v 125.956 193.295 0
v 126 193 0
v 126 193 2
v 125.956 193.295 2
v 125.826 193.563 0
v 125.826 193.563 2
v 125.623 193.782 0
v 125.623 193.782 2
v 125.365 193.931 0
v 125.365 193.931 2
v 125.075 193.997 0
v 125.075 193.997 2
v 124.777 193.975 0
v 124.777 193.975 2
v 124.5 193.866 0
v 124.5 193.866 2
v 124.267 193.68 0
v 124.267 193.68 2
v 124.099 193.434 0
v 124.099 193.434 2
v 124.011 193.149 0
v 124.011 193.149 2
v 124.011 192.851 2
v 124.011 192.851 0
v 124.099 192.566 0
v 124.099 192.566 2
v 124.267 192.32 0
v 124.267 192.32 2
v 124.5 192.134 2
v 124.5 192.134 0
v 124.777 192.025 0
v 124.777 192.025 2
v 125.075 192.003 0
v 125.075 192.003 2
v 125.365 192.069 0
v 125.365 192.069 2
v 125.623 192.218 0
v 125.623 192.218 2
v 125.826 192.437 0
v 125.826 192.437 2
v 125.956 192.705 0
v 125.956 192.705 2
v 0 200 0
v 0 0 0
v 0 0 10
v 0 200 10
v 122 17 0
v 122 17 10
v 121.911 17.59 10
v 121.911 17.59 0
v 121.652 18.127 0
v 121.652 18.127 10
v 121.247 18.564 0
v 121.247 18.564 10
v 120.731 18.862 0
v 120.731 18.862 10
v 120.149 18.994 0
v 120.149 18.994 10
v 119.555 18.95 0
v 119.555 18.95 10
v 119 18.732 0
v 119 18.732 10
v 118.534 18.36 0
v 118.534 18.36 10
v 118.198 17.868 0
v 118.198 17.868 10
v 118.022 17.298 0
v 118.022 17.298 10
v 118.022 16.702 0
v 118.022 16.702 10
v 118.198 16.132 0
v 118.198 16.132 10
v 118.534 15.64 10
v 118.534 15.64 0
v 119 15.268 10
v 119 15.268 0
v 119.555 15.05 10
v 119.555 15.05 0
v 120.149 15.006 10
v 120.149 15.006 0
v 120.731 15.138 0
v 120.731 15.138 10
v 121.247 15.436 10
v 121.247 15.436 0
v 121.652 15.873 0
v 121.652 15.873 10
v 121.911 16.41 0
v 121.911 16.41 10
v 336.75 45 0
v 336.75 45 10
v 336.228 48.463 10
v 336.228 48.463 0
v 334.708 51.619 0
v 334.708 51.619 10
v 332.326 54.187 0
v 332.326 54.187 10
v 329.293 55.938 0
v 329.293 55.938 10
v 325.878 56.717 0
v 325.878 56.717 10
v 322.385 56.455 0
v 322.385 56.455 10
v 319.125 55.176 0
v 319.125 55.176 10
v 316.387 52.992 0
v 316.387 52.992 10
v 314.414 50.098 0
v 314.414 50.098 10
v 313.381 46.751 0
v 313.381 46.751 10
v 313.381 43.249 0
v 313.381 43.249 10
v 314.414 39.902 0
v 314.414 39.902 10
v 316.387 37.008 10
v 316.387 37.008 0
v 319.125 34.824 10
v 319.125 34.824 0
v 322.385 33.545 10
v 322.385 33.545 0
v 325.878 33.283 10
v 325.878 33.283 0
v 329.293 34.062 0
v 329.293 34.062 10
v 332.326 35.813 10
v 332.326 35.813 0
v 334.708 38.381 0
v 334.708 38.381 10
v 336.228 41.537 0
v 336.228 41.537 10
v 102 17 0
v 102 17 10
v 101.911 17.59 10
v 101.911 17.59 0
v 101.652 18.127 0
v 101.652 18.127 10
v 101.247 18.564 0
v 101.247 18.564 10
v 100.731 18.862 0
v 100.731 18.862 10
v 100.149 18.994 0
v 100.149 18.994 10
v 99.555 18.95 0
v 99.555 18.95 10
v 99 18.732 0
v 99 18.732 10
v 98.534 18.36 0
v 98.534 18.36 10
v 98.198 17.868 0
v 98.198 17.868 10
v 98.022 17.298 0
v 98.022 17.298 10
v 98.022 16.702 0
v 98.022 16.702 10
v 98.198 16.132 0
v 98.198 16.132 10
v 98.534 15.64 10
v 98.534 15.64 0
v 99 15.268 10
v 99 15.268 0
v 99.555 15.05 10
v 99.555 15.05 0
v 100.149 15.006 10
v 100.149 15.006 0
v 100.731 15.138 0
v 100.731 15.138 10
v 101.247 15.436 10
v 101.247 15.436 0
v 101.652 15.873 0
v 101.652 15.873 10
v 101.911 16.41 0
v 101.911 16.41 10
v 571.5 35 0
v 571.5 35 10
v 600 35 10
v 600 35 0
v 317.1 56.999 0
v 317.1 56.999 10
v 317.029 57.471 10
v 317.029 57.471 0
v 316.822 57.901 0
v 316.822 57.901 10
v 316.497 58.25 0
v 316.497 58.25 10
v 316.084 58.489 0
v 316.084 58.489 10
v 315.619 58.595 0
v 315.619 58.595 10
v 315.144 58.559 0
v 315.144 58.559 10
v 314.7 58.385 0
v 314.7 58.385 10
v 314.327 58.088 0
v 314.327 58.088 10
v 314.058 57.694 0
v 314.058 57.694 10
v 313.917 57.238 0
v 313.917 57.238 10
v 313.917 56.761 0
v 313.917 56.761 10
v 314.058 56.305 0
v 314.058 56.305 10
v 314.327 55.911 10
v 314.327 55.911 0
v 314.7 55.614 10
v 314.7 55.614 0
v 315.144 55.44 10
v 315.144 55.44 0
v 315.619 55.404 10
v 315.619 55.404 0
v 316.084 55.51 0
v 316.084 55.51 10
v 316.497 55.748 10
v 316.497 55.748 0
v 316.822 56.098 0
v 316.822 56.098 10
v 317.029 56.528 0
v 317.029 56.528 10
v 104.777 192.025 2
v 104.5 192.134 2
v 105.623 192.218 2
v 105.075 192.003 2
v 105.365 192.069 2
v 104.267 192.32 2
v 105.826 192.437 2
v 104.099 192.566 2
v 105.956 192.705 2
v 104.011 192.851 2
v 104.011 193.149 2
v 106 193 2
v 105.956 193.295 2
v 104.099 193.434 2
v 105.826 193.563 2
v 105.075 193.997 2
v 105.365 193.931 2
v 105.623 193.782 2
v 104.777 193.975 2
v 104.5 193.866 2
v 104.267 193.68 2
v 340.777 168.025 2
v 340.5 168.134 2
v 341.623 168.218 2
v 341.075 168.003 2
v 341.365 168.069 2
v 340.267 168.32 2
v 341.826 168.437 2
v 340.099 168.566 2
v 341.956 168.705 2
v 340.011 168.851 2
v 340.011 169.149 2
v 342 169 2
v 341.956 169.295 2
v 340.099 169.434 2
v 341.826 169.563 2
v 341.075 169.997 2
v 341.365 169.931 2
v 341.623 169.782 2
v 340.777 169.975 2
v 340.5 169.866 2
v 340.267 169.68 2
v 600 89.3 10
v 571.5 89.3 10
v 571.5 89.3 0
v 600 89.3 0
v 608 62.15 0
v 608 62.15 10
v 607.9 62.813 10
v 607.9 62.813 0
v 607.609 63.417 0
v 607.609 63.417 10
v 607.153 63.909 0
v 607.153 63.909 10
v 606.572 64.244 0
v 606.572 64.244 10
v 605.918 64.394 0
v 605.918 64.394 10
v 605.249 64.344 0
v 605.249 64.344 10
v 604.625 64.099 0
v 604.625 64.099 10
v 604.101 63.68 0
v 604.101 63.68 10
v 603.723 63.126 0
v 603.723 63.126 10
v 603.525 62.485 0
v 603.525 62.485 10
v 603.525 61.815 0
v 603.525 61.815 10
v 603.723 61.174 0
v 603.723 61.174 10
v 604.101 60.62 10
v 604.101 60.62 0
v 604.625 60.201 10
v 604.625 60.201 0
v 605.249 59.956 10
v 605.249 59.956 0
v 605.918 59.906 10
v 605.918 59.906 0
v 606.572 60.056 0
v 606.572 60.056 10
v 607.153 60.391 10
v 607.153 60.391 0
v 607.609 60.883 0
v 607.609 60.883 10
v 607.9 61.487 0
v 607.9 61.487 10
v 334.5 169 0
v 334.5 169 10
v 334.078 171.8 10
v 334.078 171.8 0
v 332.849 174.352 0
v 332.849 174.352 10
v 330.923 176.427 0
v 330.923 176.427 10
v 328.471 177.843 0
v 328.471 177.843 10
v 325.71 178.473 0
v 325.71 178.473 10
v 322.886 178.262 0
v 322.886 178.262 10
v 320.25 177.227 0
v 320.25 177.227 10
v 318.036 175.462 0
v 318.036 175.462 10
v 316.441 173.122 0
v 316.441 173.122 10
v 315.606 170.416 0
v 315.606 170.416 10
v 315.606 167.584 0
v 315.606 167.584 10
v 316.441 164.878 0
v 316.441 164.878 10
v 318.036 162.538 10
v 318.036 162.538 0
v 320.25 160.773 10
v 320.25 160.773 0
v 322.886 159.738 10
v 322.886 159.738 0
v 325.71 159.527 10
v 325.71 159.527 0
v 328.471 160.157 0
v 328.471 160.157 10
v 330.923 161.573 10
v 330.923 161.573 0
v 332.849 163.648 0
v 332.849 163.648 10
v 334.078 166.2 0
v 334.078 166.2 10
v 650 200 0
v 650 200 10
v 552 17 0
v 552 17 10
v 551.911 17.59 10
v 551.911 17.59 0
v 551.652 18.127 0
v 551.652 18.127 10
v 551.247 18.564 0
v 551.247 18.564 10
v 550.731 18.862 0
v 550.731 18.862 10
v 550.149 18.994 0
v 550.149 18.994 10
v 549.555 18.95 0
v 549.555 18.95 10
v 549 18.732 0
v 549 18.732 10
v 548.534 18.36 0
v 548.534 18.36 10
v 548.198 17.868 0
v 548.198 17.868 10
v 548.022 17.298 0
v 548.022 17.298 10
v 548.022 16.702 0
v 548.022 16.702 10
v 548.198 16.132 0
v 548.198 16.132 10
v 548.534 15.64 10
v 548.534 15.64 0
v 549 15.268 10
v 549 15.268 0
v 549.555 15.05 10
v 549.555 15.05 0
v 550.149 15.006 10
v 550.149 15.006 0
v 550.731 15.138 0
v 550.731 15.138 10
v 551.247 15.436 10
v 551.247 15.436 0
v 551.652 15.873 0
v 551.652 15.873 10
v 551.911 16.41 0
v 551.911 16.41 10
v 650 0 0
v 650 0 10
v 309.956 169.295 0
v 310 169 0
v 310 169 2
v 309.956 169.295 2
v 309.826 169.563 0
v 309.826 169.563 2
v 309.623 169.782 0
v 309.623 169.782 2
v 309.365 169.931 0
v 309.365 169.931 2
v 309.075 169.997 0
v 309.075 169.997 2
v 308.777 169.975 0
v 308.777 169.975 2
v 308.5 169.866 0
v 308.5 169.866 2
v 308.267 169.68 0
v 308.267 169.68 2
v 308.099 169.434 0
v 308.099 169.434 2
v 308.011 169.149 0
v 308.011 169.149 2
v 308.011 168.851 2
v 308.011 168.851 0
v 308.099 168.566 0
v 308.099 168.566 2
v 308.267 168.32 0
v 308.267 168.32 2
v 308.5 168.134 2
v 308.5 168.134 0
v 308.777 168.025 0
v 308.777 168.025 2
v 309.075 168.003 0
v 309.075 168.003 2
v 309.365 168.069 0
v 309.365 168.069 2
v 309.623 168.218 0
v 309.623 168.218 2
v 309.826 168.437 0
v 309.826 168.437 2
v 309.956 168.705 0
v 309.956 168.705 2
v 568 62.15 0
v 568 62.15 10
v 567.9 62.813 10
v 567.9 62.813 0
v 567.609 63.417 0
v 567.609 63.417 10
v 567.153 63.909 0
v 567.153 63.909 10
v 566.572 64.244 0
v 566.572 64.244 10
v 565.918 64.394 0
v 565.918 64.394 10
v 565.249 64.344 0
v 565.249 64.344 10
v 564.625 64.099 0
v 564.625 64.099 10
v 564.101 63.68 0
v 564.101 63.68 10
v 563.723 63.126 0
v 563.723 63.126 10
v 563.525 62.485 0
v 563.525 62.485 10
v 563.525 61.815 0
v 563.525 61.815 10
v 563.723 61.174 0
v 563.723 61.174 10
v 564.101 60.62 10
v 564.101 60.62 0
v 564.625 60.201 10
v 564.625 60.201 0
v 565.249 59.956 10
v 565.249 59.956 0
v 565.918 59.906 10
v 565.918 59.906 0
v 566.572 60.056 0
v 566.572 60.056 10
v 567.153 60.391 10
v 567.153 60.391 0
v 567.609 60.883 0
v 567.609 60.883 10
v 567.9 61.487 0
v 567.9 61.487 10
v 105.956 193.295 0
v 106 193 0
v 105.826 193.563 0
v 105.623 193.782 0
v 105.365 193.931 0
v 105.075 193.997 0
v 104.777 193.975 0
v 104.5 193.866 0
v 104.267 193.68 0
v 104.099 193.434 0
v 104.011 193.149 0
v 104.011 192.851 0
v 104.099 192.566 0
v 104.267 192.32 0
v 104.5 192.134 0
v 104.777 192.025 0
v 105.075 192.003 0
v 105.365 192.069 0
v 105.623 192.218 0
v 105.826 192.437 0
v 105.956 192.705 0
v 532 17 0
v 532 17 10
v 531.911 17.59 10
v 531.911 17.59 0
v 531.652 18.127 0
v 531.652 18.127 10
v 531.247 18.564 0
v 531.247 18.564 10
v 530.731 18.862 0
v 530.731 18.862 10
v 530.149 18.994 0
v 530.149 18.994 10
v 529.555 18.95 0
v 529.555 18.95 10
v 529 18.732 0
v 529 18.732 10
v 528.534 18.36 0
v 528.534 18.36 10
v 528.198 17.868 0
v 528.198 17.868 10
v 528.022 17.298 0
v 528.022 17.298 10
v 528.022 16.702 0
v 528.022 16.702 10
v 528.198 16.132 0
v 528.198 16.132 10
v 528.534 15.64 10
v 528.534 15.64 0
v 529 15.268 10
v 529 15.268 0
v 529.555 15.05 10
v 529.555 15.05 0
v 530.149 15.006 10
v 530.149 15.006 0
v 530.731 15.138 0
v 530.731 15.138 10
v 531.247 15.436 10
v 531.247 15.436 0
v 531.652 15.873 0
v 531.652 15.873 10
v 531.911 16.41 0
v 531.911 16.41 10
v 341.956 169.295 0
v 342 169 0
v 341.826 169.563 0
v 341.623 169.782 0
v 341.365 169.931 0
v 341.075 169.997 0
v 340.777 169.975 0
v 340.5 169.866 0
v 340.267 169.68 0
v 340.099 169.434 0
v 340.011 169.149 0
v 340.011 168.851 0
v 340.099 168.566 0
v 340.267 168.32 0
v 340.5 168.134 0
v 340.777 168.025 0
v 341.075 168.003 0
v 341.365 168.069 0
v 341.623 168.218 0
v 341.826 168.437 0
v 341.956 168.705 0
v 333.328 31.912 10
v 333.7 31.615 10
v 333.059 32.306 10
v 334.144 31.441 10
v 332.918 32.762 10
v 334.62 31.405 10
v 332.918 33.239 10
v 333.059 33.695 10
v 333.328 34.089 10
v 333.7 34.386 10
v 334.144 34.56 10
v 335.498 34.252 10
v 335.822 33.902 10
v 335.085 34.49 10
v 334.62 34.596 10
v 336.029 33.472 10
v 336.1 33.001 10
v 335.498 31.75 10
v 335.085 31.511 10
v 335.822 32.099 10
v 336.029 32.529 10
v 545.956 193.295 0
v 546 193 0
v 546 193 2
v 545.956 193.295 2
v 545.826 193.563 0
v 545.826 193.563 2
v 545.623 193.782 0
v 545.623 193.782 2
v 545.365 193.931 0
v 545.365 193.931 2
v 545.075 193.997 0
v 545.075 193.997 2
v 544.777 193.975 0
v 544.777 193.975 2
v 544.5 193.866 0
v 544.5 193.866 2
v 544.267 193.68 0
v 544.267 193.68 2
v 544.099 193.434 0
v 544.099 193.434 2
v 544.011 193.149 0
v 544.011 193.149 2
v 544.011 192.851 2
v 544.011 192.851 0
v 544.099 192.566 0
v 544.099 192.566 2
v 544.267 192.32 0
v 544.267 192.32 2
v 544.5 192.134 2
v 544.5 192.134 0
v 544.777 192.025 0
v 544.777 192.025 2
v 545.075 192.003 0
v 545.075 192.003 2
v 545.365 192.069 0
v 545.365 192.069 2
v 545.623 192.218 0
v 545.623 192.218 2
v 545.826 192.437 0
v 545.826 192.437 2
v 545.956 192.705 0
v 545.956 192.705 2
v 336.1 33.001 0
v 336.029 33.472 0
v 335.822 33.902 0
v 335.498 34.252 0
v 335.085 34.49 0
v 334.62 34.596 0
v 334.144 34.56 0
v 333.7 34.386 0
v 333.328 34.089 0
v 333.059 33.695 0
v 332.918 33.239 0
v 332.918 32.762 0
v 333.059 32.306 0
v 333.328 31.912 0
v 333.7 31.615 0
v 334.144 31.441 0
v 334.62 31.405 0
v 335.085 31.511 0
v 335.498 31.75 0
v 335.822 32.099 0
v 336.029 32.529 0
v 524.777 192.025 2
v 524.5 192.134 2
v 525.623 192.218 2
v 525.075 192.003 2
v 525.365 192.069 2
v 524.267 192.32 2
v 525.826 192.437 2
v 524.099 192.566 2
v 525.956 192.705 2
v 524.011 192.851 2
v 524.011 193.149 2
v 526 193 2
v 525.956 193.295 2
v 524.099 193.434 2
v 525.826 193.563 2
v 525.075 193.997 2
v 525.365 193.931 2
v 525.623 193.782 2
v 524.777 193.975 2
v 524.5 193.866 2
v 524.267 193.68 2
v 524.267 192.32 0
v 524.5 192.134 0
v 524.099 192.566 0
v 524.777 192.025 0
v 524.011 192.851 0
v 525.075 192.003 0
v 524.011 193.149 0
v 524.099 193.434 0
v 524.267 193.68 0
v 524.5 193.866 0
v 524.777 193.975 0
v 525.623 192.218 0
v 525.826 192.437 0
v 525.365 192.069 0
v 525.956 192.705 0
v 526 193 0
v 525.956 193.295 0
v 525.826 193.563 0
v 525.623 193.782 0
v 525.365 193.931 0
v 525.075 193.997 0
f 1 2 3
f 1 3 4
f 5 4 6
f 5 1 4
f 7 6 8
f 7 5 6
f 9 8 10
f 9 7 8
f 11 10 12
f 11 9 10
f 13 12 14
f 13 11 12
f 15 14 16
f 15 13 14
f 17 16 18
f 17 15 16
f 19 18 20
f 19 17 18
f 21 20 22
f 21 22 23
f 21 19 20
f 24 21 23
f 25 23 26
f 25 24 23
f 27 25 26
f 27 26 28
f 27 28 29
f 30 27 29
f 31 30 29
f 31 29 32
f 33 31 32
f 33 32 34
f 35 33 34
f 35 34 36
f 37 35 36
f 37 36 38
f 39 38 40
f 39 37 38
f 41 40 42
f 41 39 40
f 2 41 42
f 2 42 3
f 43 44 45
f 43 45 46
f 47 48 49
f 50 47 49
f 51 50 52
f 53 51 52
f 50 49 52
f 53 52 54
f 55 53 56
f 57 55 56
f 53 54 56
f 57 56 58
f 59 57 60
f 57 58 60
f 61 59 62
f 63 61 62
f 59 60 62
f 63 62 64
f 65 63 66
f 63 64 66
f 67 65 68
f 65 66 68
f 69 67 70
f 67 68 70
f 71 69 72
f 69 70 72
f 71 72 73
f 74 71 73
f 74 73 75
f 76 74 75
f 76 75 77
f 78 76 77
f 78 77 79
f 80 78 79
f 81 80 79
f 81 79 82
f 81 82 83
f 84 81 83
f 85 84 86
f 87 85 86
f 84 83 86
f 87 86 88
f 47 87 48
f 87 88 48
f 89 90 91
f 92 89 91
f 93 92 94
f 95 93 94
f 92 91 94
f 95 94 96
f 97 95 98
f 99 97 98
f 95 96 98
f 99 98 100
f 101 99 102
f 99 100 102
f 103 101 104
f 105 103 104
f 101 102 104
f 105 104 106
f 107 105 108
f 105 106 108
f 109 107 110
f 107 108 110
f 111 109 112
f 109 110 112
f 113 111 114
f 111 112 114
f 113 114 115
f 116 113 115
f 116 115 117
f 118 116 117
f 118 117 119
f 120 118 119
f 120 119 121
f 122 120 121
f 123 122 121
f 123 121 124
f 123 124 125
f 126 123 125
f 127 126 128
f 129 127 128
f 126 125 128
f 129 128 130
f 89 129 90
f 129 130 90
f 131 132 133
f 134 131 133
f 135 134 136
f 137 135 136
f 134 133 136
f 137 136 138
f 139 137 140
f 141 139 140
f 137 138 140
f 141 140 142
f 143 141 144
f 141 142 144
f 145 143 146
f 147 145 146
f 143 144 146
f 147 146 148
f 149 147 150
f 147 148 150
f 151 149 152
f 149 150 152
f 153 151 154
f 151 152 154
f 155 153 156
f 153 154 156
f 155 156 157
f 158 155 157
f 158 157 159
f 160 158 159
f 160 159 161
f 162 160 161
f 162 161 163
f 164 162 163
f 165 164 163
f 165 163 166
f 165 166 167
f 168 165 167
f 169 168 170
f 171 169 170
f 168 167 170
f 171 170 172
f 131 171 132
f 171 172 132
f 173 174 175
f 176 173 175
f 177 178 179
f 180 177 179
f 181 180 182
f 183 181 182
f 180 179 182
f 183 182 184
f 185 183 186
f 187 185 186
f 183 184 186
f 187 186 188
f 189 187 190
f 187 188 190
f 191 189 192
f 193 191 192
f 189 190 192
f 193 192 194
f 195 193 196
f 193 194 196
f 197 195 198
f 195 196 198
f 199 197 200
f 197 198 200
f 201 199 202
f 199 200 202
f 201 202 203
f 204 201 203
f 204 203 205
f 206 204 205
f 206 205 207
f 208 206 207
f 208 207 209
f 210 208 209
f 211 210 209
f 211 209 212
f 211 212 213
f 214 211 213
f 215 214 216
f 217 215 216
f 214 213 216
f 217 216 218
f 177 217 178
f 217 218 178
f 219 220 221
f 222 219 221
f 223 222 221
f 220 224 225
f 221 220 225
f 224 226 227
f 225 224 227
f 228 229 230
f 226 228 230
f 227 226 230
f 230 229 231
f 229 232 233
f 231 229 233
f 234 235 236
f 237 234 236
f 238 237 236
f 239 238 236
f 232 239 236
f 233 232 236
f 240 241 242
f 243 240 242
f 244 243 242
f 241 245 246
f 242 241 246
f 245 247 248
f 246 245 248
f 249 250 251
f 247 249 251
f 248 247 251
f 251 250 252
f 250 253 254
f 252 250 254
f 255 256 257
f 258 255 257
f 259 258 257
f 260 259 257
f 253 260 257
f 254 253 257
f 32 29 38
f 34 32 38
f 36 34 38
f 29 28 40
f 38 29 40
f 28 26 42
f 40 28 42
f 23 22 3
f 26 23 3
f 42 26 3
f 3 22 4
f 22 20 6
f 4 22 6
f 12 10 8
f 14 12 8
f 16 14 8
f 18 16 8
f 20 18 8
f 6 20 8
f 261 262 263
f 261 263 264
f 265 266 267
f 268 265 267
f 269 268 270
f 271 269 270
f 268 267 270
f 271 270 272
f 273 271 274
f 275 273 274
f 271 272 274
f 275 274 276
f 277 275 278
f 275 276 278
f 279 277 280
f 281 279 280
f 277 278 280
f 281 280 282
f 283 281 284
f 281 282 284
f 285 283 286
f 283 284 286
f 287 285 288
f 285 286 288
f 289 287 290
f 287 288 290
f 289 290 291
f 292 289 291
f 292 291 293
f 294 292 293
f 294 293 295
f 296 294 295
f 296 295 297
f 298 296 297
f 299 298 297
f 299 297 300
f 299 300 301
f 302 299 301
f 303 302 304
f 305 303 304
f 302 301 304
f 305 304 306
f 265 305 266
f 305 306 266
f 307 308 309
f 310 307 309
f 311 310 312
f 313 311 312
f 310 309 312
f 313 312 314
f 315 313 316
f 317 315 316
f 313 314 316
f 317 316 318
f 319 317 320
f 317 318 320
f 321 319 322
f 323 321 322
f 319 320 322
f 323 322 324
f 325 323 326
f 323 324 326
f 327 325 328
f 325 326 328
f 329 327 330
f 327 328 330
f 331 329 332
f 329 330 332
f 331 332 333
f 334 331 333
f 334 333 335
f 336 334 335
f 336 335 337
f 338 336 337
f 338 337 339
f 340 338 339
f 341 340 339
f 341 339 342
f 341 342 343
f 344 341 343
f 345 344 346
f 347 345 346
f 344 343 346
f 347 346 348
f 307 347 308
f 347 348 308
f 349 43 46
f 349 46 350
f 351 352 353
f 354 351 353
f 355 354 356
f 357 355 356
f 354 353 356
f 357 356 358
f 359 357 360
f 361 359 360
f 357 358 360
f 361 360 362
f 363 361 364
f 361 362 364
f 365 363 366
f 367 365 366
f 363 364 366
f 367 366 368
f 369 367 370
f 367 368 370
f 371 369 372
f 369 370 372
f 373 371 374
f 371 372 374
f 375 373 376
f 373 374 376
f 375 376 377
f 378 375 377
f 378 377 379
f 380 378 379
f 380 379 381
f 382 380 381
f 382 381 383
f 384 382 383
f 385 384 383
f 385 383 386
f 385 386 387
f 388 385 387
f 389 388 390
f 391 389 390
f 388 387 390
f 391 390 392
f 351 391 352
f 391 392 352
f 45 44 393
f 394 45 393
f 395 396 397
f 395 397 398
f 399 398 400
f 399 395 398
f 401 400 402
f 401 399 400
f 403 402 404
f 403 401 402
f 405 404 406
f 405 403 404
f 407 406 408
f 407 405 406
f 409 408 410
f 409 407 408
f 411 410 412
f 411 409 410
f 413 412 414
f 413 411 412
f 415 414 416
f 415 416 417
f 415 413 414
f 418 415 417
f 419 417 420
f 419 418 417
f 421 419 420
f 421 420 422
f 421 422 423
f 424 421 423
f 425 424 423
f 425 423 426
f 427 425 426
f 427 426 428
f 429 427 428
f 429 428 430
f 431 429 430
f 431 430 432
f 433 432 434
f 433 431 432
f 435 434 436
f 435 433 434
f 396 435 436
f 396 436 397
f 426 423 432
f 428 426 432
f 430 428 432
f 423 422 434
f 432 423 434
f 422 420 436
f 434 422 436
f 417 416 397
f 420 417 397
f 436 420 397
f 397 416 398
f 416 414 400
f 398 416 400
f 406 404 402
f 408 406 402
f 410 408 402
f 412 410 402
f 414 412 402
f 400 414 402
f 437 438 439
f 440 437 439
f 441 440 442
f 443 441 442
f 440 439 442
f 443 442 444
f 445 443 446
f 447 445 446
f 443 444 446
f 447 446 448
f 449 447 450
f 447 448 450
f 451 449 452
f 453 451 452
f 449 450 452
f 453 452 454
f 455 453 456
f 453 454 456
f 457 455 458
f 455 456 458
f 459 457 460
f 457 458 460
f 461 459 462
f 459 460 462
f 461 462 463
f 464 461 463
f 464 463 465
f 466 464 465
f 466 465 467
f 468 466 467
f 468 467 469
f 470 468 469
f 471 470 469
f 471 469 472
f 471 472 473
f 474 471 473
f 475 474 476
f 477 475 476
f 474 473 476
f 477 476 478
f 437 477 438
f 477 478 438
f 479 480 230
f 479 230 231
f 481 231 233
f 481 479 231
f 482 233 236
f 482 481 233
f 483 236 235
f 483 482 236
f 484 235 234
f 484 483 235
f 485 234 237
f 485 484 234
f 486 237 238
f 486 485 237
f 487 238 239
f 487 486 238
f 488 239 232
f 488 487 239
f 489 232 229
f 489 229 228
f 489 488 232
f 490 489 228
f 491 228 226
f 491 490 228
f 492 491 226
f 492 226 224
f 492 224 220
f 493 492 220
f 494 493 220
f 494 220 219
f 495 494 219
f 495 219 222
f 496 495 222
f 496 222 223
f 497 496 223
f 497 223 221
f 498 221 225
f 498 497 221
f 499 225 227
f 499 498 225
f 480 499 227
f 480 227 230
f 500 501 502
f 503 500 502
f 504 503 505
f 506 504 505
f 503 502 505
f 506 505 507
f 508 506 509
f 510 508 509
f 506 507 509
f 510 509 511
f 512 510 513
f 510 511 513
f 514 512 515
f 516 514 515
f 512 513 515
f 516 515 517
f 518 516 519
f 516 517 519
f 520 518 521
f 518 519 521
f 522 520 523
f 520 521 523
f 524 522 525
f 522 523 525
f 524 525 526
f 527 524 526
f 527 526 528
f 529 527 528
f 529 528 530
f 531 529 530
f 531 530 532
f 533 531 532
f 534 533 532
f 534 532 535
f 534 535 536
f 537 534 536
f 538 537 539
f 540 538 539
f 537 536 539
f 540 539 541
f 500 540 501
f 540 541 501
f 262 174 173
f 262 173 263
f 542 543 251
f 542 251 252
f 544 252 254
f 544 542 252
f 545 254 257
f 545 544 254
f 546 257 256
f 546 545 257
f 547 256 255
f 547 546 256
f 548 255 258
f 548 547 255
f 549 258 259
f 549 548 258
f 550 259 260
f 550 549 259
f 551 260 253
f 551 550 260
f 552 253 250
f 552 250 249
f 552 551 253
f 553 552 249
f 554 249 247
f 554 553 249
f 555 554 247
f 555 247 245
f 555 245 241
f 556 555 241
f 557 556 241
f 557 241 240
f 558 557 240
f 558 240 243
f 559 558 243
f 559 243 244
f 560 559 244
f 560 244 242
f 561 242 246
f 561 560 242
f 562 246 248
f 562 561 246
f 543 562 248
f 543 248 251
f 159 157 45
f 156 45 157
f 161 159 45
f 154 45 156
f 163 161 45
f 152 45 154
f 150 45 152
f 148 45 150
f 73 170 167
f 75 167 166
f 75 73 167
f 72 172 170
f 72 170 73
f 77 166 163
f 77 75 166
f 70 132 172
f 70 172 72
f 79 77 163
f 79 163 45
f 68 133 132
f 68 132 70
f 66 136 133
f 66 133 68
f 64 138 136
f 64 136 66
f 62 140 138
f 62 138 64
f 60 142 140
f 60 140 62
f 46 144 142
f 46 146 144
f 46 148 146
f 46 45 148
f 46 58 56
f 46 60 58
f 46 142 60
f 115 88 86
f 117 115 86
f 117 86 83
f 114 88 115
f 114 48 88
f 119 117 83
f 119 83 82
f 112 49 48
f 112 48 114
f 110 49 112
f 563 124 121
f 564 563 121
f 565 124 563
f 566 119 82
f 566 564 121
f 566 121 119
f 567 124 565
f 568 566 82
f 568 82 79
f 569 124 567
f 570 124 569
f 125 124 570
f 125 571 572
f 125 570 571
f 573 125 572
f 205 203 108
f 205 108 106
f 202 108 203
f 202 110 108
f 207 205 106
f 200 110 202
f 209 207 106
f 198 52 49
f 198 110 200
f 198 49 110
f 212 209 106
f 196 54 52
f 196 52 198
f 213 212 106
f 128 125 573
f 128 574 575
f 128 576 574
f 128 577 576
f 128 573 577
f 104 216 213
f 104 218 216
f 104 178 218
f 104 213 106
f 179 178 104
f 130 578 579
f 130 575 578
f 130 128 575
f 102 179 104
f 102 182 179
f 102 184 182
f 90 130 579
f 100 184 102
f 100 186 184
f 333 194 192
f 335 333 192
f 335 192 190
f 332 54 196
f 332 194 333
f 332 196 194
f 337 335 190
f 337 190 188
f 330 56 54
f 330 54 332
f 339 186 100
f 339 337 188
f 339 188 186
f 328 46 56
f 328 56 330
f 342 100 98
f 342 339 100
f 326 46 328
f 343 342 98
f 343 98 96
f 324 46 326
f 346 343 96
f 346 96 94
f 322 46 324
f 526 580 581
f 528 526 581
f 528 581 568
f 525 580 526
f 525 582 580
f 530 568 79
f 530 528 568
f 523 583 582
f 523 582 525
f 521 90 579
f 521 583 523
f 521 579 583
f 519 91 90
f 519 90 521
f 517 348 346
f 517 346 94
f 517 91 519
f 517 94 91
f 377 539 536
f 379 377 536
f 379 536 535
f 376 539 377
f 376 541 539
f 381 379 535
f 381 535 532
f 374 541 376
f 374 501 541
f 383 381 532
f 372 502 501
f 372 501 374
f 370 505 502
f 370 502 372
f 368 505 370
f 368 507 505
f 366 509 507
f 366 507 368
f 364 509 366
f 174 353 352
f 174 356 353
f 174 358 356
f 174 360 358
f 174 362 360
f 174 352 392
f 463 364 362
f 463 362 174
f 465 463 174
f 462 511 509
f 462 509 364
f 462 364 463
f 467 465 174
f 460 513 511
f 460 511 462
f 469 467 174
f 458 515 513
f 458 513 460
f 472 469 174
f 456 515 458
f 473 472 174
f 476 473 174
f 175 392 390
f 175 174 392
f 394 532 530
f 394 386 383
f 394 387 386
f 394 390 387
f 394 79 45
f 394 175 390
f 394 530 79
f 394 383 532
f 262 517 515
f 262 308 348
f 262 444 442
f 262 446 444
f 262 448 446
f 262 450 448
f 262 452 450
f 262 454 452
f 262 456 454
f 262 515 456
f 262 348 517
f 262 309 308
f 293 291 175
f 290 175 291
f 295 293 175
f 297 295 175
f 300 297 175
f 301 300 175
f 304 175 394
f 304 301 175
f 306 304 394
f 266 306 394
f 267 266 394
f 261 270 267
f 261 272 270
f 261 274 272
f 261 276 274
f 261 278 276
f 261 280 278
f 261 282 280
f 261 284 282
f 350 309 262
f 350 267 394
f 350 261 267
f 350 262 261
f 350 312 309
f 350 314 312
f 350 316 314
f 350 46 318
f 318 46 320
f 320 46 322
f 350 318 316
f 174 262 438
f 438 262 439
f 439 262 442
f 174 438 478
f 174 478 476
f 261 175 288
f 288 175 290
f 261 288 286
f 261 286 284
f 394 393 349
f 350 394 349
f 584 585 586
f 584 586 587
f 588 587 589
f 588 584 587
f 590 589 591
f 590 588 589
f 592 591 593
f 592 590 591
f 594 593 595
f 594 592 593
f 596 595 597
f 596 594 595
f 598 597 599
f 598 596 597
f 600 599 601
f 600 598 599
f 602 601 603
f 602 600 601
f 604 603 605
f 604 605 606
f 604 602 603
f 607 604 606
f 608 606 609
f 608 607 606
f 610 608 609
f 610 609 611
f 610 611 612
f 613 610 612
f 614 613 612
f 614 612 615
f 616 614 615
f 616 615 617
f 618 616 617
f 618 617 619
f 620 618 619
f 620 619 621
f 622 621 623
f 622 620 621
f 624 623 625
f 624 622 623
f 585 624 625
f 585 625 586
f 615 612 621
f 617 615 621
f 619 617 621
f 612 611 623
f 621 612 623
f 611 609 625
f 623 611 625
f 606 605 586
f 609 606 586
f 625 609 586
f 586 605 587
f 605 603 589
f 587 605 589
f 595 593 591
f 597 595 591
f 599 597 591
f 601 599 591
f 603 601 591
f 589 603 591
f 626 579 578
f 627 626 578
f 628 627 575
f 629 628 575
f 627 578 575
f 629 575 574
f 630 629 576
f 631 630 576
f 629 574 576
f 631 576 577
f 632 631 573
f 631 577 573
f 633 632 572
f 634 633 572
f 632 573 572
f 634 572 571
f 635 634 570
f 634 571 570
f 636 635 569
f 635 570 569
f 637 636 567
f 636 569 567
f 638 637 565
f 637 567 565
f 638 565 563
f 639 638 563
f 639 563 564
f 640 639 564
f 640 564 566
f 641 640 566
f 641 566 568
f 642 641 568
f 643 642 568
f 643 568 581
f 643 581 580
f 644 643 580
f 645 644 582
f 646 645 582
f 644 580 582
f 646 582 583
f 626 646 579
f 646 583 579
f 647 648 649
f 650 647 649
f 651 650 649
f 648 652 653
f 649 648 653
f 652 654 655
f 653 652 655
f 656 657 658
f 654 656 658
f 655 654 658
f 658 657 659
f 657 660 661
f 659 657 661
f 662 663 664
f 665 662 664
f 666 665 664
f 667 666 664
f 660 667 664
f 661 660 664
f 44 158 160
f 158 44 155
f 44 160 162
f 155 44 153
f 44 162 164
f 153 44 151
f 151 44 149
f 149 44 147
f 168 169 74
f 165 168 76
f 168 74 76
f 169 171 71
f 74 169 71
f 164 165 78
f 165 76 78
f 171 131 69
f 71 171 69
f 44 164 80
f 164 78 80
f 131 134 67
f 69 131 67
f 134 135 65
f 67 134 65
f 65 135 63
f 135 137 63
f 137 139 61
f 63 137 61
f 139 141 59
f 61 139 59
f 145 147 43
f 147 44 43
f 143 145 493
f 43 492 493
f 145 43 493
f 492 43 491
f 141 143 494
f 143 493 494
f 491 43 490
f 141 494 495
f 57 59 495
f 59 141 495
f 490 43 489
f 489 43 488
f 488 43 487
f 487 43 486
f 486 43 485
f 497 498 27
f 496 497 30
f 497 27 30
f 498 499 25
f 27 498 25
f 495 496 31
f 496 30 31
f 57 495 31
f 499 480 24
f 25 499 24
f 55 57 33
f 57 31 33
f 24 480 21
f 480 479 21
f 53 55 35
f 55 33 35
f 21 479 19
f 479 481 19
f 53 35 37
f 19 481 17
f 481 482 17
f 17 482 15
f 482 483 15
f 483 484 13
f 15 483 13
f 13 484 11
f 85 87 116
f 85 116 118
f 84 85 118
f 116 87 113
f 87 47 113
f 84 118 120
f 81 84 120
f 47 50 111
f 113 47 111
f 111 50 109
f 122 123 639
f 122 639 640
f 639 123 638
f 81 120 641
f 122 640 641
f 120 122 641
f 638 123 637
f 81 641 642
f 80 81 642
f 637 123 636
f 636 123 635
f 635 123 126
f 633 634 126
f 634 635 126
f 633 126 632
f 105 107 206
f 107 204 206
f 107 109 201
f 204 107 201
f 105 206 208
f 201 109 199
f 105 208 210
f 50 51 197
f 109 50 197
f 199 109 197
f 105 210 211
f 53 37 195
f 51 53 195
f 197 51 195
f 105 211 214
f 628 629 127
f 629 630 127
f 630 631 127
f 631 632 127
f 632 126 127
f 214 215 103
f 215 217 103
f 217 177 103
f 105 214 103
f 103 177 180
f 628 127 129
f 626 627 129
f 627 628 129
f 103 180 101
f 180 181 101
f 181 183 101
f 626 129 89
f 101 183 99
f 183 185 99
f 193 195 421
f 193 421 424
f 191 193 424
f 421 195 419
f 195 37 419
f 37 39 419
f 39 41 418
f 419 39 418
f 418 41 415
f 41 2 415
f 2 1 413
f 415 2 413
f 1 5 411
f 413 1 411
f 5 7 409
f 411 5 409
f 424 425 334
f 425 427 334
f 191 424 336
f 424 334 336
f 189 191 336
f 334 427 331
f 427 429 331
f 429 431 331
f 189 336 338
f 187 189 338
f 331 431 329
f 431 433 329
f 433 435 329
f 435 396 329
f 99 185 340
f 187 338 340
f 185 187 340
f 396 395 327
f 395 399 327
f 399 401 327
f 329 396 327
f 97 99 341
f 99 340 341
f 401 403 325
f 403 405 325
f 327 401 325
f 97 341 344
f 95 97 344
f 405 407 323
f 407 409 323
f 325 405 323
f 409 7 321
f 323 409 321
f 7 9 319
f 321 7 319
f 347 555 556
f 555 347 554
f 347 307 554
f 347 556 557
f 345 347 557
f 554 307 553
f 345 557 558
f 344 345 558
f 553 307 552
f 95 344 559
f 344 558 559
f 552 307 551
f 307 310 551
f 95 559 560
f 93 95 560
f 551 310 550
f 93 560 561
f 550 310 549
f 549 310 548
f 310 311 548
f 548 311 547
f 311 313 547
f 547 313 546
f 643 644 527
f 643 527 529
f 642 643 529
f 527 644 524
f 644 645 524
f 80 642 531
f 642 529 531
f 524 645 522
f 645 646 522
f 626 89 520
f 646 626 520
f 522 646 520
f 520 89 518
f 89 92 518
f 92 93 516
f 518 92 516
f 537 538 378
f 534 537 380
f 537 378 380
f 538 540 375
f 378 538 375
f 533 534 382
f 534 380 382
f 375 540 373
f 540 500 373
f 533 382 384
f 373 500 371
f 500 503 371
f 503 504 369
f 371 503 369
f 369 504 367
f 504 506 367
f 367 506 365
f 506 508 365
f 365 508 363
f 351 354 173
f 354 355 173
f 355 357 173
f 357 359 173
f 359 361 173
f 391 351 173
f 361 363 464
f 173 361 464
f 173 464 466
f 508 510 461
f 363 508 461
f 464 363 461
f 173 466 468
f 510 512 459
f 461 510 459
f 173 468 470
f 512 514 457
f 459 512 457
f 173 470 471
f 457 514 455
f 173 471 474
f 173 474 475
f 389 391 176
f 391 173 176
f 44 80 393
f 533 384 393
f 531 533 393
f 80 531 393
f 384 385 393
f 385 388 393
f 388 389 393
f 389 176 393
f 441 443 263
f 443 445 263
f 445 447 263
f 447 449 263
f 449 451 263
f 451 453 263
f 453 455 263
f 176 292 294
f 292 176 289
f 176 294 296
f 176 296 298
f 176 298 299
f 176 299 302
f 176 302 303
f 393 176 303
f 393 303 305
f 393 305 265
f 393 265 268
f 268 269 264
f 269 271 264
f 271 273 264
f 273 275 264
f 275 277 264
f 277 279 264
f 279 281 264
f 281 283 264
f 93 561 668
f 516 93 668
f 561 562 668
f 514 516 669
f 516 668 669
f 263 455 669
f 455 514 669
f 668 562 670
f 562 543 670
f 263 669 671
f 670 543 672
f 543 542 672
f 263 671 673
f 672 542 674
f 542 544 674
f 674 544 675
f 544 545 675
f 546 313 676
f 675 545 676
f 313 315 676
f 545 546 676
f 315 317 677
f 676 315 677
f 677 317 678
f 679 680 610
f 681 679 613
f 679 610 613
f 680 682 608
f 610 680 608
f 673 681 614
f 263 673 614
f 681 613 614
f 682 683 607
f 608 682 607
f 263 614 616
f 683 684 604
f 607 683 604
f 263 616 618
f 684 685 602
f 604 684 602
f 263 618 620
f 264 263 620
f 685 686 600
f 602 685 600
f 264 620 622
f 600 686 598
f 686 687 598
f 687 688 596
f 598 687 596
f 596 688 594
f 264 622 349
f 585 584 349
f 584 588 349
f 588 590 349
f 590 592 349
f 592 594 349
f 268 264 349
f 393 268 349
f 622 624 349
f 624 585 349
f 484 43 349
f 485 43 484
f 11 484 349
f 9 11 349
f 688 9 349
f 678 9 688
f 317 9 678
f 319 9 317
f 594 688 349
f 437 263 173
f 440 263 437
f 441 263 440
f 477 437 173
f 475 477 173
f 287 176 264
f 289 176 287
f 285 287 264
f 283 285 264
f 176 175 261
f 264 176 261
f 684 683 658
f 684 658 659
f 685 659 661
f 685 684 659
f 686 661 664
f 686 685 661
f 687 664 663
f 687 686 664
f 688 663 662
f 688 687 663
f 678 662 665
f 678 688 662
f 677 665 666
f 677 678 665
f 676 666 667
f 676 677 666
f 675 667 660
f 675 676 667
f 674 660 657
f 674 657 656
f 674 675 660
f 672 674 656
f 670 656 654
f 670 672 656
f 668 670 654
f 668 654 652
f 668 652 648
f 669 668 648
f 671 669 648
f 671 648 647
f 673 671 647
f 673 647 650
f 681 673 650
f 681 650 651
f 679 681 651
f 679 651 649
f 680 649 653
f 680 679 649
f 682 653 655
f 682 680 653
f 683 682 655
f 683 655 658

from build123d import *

# Parameters (mm, degrees)
ESQUISSE1_W             = 650
ESQUISSE1_H             = 200
BOSS_EXTRU_1_DEPTH      = 10
ESQUISSE2_R             = 2
ENL_V_MAT_EXTRU_1_DEPTH = 10
ESQUISSE3_R             = 1.6
ESQUISSE3_R_2           = 11.75
ESQUISSE3_W             = 28.5
ESQUISSE3_H             = 54.3
ESQUISSE3_R_3           = 2.25
ENL_V_MAT_EXTRU_2_DEPTH = 10
ESQUISSE4_R             = 9.5
ENL_V_MAT_EXTRU_3_DEPTH = 10
ESQUISSE5_R             = 1
ENL_V_MAT_EXTRU_4_DEPTH = 2


with BuildPart() as part:
    # Esquisse1 → Boss.-Extru.1 (new body)
    with BuildSketch(Plane.XY):
        with Locations((325, 100)):
            Rectangle(ESQUISSE1_W, ESQUISSE1_H)
    extrude(amount=BOSS_EXTRU_1_DEPTH)

    # Esquisse2 → Enlèv. mat.-Extru.1 (cut)
    with BuildSketch(Plane.XY.offset(10)):
        with Locations((100, 17)):
            Circle(ESQUISSE2_R)
        with Locations((120, 17)):
            Circle(ESQUISSE2_R)
        with Locations((530, 17)):
            Circle(ESQUISSE2_R)
        with Locations((550, 17)):
            Circle(ESQUISSE2_R)
    extrude(amount=-ENL_V_MAT_EXTRU_1_DEPTH, mode=Mode.SUBTRACT)

    # Esquisse3 → Enlèv. mat.-Extru.2 (cut)
    with BuildSketch(Plane.XY.offset(10)):
        with Locations((315.499614794, 56.999404399)):
            Circle(ESQUISSE3_R)
        with Locations((325, 45)):
            Circle(ESQUISSE3_R_2)
        with Locations((334.500385206, 33.000595601)):
            Circle(ESQUISSE3_R)
        with Locations((585.75, 62.15)):
            Rectangle(ESQUISSE3_W, ESQUISSE3_H)
        with Locations((565.75, 62.15)):
            Circle(ESQUISSE3_R_3)
        with Locations((605.75, 62.15)):
            Circle(ESQUISSE3_R_3)
    extrude(amount=-ENL_V_MAT_EXTRU_2_DEPTH, mode=Mode.SUBTRACT)

    # Esquisse4 → Enlèv. mat.-Extru.3 (cut)
    with BuildSketch(Plane.XY.offset(10)):
        with Locations((325, 169)):
            Circle(ESQUISSE4_R)
    extrude(amount=-ENL_V_MAT_EXTRU_3_DEPTH, mode=Mode.SUBTRACT)

    # Esquisse5 → Enlèv. mat.-Extru.4 (cut)
    with BuildSketch(Plane.XY):
        with Locations((341, 169)):
            Circle(ESQUISSE5_R)
        with Locations((309, 169)):
            Circle(ESQUISSE5_R)
        with Locations((125, 193)):
            Circle(ESQUISSE5_R)
        with Locations((105, 193)):
            Circle(ESQUISSE5_R)
        with Locations((545, 193)):
            Circle(ESQUISSE5_R)
        with Locations((525, 193)):
            Circle(ESQUISSE5_R)
    extrude(amount=ENL_V_MAT_EXTRU_4_DEPTH, mode=Mode.SUBTRACT)


solid = part.part
